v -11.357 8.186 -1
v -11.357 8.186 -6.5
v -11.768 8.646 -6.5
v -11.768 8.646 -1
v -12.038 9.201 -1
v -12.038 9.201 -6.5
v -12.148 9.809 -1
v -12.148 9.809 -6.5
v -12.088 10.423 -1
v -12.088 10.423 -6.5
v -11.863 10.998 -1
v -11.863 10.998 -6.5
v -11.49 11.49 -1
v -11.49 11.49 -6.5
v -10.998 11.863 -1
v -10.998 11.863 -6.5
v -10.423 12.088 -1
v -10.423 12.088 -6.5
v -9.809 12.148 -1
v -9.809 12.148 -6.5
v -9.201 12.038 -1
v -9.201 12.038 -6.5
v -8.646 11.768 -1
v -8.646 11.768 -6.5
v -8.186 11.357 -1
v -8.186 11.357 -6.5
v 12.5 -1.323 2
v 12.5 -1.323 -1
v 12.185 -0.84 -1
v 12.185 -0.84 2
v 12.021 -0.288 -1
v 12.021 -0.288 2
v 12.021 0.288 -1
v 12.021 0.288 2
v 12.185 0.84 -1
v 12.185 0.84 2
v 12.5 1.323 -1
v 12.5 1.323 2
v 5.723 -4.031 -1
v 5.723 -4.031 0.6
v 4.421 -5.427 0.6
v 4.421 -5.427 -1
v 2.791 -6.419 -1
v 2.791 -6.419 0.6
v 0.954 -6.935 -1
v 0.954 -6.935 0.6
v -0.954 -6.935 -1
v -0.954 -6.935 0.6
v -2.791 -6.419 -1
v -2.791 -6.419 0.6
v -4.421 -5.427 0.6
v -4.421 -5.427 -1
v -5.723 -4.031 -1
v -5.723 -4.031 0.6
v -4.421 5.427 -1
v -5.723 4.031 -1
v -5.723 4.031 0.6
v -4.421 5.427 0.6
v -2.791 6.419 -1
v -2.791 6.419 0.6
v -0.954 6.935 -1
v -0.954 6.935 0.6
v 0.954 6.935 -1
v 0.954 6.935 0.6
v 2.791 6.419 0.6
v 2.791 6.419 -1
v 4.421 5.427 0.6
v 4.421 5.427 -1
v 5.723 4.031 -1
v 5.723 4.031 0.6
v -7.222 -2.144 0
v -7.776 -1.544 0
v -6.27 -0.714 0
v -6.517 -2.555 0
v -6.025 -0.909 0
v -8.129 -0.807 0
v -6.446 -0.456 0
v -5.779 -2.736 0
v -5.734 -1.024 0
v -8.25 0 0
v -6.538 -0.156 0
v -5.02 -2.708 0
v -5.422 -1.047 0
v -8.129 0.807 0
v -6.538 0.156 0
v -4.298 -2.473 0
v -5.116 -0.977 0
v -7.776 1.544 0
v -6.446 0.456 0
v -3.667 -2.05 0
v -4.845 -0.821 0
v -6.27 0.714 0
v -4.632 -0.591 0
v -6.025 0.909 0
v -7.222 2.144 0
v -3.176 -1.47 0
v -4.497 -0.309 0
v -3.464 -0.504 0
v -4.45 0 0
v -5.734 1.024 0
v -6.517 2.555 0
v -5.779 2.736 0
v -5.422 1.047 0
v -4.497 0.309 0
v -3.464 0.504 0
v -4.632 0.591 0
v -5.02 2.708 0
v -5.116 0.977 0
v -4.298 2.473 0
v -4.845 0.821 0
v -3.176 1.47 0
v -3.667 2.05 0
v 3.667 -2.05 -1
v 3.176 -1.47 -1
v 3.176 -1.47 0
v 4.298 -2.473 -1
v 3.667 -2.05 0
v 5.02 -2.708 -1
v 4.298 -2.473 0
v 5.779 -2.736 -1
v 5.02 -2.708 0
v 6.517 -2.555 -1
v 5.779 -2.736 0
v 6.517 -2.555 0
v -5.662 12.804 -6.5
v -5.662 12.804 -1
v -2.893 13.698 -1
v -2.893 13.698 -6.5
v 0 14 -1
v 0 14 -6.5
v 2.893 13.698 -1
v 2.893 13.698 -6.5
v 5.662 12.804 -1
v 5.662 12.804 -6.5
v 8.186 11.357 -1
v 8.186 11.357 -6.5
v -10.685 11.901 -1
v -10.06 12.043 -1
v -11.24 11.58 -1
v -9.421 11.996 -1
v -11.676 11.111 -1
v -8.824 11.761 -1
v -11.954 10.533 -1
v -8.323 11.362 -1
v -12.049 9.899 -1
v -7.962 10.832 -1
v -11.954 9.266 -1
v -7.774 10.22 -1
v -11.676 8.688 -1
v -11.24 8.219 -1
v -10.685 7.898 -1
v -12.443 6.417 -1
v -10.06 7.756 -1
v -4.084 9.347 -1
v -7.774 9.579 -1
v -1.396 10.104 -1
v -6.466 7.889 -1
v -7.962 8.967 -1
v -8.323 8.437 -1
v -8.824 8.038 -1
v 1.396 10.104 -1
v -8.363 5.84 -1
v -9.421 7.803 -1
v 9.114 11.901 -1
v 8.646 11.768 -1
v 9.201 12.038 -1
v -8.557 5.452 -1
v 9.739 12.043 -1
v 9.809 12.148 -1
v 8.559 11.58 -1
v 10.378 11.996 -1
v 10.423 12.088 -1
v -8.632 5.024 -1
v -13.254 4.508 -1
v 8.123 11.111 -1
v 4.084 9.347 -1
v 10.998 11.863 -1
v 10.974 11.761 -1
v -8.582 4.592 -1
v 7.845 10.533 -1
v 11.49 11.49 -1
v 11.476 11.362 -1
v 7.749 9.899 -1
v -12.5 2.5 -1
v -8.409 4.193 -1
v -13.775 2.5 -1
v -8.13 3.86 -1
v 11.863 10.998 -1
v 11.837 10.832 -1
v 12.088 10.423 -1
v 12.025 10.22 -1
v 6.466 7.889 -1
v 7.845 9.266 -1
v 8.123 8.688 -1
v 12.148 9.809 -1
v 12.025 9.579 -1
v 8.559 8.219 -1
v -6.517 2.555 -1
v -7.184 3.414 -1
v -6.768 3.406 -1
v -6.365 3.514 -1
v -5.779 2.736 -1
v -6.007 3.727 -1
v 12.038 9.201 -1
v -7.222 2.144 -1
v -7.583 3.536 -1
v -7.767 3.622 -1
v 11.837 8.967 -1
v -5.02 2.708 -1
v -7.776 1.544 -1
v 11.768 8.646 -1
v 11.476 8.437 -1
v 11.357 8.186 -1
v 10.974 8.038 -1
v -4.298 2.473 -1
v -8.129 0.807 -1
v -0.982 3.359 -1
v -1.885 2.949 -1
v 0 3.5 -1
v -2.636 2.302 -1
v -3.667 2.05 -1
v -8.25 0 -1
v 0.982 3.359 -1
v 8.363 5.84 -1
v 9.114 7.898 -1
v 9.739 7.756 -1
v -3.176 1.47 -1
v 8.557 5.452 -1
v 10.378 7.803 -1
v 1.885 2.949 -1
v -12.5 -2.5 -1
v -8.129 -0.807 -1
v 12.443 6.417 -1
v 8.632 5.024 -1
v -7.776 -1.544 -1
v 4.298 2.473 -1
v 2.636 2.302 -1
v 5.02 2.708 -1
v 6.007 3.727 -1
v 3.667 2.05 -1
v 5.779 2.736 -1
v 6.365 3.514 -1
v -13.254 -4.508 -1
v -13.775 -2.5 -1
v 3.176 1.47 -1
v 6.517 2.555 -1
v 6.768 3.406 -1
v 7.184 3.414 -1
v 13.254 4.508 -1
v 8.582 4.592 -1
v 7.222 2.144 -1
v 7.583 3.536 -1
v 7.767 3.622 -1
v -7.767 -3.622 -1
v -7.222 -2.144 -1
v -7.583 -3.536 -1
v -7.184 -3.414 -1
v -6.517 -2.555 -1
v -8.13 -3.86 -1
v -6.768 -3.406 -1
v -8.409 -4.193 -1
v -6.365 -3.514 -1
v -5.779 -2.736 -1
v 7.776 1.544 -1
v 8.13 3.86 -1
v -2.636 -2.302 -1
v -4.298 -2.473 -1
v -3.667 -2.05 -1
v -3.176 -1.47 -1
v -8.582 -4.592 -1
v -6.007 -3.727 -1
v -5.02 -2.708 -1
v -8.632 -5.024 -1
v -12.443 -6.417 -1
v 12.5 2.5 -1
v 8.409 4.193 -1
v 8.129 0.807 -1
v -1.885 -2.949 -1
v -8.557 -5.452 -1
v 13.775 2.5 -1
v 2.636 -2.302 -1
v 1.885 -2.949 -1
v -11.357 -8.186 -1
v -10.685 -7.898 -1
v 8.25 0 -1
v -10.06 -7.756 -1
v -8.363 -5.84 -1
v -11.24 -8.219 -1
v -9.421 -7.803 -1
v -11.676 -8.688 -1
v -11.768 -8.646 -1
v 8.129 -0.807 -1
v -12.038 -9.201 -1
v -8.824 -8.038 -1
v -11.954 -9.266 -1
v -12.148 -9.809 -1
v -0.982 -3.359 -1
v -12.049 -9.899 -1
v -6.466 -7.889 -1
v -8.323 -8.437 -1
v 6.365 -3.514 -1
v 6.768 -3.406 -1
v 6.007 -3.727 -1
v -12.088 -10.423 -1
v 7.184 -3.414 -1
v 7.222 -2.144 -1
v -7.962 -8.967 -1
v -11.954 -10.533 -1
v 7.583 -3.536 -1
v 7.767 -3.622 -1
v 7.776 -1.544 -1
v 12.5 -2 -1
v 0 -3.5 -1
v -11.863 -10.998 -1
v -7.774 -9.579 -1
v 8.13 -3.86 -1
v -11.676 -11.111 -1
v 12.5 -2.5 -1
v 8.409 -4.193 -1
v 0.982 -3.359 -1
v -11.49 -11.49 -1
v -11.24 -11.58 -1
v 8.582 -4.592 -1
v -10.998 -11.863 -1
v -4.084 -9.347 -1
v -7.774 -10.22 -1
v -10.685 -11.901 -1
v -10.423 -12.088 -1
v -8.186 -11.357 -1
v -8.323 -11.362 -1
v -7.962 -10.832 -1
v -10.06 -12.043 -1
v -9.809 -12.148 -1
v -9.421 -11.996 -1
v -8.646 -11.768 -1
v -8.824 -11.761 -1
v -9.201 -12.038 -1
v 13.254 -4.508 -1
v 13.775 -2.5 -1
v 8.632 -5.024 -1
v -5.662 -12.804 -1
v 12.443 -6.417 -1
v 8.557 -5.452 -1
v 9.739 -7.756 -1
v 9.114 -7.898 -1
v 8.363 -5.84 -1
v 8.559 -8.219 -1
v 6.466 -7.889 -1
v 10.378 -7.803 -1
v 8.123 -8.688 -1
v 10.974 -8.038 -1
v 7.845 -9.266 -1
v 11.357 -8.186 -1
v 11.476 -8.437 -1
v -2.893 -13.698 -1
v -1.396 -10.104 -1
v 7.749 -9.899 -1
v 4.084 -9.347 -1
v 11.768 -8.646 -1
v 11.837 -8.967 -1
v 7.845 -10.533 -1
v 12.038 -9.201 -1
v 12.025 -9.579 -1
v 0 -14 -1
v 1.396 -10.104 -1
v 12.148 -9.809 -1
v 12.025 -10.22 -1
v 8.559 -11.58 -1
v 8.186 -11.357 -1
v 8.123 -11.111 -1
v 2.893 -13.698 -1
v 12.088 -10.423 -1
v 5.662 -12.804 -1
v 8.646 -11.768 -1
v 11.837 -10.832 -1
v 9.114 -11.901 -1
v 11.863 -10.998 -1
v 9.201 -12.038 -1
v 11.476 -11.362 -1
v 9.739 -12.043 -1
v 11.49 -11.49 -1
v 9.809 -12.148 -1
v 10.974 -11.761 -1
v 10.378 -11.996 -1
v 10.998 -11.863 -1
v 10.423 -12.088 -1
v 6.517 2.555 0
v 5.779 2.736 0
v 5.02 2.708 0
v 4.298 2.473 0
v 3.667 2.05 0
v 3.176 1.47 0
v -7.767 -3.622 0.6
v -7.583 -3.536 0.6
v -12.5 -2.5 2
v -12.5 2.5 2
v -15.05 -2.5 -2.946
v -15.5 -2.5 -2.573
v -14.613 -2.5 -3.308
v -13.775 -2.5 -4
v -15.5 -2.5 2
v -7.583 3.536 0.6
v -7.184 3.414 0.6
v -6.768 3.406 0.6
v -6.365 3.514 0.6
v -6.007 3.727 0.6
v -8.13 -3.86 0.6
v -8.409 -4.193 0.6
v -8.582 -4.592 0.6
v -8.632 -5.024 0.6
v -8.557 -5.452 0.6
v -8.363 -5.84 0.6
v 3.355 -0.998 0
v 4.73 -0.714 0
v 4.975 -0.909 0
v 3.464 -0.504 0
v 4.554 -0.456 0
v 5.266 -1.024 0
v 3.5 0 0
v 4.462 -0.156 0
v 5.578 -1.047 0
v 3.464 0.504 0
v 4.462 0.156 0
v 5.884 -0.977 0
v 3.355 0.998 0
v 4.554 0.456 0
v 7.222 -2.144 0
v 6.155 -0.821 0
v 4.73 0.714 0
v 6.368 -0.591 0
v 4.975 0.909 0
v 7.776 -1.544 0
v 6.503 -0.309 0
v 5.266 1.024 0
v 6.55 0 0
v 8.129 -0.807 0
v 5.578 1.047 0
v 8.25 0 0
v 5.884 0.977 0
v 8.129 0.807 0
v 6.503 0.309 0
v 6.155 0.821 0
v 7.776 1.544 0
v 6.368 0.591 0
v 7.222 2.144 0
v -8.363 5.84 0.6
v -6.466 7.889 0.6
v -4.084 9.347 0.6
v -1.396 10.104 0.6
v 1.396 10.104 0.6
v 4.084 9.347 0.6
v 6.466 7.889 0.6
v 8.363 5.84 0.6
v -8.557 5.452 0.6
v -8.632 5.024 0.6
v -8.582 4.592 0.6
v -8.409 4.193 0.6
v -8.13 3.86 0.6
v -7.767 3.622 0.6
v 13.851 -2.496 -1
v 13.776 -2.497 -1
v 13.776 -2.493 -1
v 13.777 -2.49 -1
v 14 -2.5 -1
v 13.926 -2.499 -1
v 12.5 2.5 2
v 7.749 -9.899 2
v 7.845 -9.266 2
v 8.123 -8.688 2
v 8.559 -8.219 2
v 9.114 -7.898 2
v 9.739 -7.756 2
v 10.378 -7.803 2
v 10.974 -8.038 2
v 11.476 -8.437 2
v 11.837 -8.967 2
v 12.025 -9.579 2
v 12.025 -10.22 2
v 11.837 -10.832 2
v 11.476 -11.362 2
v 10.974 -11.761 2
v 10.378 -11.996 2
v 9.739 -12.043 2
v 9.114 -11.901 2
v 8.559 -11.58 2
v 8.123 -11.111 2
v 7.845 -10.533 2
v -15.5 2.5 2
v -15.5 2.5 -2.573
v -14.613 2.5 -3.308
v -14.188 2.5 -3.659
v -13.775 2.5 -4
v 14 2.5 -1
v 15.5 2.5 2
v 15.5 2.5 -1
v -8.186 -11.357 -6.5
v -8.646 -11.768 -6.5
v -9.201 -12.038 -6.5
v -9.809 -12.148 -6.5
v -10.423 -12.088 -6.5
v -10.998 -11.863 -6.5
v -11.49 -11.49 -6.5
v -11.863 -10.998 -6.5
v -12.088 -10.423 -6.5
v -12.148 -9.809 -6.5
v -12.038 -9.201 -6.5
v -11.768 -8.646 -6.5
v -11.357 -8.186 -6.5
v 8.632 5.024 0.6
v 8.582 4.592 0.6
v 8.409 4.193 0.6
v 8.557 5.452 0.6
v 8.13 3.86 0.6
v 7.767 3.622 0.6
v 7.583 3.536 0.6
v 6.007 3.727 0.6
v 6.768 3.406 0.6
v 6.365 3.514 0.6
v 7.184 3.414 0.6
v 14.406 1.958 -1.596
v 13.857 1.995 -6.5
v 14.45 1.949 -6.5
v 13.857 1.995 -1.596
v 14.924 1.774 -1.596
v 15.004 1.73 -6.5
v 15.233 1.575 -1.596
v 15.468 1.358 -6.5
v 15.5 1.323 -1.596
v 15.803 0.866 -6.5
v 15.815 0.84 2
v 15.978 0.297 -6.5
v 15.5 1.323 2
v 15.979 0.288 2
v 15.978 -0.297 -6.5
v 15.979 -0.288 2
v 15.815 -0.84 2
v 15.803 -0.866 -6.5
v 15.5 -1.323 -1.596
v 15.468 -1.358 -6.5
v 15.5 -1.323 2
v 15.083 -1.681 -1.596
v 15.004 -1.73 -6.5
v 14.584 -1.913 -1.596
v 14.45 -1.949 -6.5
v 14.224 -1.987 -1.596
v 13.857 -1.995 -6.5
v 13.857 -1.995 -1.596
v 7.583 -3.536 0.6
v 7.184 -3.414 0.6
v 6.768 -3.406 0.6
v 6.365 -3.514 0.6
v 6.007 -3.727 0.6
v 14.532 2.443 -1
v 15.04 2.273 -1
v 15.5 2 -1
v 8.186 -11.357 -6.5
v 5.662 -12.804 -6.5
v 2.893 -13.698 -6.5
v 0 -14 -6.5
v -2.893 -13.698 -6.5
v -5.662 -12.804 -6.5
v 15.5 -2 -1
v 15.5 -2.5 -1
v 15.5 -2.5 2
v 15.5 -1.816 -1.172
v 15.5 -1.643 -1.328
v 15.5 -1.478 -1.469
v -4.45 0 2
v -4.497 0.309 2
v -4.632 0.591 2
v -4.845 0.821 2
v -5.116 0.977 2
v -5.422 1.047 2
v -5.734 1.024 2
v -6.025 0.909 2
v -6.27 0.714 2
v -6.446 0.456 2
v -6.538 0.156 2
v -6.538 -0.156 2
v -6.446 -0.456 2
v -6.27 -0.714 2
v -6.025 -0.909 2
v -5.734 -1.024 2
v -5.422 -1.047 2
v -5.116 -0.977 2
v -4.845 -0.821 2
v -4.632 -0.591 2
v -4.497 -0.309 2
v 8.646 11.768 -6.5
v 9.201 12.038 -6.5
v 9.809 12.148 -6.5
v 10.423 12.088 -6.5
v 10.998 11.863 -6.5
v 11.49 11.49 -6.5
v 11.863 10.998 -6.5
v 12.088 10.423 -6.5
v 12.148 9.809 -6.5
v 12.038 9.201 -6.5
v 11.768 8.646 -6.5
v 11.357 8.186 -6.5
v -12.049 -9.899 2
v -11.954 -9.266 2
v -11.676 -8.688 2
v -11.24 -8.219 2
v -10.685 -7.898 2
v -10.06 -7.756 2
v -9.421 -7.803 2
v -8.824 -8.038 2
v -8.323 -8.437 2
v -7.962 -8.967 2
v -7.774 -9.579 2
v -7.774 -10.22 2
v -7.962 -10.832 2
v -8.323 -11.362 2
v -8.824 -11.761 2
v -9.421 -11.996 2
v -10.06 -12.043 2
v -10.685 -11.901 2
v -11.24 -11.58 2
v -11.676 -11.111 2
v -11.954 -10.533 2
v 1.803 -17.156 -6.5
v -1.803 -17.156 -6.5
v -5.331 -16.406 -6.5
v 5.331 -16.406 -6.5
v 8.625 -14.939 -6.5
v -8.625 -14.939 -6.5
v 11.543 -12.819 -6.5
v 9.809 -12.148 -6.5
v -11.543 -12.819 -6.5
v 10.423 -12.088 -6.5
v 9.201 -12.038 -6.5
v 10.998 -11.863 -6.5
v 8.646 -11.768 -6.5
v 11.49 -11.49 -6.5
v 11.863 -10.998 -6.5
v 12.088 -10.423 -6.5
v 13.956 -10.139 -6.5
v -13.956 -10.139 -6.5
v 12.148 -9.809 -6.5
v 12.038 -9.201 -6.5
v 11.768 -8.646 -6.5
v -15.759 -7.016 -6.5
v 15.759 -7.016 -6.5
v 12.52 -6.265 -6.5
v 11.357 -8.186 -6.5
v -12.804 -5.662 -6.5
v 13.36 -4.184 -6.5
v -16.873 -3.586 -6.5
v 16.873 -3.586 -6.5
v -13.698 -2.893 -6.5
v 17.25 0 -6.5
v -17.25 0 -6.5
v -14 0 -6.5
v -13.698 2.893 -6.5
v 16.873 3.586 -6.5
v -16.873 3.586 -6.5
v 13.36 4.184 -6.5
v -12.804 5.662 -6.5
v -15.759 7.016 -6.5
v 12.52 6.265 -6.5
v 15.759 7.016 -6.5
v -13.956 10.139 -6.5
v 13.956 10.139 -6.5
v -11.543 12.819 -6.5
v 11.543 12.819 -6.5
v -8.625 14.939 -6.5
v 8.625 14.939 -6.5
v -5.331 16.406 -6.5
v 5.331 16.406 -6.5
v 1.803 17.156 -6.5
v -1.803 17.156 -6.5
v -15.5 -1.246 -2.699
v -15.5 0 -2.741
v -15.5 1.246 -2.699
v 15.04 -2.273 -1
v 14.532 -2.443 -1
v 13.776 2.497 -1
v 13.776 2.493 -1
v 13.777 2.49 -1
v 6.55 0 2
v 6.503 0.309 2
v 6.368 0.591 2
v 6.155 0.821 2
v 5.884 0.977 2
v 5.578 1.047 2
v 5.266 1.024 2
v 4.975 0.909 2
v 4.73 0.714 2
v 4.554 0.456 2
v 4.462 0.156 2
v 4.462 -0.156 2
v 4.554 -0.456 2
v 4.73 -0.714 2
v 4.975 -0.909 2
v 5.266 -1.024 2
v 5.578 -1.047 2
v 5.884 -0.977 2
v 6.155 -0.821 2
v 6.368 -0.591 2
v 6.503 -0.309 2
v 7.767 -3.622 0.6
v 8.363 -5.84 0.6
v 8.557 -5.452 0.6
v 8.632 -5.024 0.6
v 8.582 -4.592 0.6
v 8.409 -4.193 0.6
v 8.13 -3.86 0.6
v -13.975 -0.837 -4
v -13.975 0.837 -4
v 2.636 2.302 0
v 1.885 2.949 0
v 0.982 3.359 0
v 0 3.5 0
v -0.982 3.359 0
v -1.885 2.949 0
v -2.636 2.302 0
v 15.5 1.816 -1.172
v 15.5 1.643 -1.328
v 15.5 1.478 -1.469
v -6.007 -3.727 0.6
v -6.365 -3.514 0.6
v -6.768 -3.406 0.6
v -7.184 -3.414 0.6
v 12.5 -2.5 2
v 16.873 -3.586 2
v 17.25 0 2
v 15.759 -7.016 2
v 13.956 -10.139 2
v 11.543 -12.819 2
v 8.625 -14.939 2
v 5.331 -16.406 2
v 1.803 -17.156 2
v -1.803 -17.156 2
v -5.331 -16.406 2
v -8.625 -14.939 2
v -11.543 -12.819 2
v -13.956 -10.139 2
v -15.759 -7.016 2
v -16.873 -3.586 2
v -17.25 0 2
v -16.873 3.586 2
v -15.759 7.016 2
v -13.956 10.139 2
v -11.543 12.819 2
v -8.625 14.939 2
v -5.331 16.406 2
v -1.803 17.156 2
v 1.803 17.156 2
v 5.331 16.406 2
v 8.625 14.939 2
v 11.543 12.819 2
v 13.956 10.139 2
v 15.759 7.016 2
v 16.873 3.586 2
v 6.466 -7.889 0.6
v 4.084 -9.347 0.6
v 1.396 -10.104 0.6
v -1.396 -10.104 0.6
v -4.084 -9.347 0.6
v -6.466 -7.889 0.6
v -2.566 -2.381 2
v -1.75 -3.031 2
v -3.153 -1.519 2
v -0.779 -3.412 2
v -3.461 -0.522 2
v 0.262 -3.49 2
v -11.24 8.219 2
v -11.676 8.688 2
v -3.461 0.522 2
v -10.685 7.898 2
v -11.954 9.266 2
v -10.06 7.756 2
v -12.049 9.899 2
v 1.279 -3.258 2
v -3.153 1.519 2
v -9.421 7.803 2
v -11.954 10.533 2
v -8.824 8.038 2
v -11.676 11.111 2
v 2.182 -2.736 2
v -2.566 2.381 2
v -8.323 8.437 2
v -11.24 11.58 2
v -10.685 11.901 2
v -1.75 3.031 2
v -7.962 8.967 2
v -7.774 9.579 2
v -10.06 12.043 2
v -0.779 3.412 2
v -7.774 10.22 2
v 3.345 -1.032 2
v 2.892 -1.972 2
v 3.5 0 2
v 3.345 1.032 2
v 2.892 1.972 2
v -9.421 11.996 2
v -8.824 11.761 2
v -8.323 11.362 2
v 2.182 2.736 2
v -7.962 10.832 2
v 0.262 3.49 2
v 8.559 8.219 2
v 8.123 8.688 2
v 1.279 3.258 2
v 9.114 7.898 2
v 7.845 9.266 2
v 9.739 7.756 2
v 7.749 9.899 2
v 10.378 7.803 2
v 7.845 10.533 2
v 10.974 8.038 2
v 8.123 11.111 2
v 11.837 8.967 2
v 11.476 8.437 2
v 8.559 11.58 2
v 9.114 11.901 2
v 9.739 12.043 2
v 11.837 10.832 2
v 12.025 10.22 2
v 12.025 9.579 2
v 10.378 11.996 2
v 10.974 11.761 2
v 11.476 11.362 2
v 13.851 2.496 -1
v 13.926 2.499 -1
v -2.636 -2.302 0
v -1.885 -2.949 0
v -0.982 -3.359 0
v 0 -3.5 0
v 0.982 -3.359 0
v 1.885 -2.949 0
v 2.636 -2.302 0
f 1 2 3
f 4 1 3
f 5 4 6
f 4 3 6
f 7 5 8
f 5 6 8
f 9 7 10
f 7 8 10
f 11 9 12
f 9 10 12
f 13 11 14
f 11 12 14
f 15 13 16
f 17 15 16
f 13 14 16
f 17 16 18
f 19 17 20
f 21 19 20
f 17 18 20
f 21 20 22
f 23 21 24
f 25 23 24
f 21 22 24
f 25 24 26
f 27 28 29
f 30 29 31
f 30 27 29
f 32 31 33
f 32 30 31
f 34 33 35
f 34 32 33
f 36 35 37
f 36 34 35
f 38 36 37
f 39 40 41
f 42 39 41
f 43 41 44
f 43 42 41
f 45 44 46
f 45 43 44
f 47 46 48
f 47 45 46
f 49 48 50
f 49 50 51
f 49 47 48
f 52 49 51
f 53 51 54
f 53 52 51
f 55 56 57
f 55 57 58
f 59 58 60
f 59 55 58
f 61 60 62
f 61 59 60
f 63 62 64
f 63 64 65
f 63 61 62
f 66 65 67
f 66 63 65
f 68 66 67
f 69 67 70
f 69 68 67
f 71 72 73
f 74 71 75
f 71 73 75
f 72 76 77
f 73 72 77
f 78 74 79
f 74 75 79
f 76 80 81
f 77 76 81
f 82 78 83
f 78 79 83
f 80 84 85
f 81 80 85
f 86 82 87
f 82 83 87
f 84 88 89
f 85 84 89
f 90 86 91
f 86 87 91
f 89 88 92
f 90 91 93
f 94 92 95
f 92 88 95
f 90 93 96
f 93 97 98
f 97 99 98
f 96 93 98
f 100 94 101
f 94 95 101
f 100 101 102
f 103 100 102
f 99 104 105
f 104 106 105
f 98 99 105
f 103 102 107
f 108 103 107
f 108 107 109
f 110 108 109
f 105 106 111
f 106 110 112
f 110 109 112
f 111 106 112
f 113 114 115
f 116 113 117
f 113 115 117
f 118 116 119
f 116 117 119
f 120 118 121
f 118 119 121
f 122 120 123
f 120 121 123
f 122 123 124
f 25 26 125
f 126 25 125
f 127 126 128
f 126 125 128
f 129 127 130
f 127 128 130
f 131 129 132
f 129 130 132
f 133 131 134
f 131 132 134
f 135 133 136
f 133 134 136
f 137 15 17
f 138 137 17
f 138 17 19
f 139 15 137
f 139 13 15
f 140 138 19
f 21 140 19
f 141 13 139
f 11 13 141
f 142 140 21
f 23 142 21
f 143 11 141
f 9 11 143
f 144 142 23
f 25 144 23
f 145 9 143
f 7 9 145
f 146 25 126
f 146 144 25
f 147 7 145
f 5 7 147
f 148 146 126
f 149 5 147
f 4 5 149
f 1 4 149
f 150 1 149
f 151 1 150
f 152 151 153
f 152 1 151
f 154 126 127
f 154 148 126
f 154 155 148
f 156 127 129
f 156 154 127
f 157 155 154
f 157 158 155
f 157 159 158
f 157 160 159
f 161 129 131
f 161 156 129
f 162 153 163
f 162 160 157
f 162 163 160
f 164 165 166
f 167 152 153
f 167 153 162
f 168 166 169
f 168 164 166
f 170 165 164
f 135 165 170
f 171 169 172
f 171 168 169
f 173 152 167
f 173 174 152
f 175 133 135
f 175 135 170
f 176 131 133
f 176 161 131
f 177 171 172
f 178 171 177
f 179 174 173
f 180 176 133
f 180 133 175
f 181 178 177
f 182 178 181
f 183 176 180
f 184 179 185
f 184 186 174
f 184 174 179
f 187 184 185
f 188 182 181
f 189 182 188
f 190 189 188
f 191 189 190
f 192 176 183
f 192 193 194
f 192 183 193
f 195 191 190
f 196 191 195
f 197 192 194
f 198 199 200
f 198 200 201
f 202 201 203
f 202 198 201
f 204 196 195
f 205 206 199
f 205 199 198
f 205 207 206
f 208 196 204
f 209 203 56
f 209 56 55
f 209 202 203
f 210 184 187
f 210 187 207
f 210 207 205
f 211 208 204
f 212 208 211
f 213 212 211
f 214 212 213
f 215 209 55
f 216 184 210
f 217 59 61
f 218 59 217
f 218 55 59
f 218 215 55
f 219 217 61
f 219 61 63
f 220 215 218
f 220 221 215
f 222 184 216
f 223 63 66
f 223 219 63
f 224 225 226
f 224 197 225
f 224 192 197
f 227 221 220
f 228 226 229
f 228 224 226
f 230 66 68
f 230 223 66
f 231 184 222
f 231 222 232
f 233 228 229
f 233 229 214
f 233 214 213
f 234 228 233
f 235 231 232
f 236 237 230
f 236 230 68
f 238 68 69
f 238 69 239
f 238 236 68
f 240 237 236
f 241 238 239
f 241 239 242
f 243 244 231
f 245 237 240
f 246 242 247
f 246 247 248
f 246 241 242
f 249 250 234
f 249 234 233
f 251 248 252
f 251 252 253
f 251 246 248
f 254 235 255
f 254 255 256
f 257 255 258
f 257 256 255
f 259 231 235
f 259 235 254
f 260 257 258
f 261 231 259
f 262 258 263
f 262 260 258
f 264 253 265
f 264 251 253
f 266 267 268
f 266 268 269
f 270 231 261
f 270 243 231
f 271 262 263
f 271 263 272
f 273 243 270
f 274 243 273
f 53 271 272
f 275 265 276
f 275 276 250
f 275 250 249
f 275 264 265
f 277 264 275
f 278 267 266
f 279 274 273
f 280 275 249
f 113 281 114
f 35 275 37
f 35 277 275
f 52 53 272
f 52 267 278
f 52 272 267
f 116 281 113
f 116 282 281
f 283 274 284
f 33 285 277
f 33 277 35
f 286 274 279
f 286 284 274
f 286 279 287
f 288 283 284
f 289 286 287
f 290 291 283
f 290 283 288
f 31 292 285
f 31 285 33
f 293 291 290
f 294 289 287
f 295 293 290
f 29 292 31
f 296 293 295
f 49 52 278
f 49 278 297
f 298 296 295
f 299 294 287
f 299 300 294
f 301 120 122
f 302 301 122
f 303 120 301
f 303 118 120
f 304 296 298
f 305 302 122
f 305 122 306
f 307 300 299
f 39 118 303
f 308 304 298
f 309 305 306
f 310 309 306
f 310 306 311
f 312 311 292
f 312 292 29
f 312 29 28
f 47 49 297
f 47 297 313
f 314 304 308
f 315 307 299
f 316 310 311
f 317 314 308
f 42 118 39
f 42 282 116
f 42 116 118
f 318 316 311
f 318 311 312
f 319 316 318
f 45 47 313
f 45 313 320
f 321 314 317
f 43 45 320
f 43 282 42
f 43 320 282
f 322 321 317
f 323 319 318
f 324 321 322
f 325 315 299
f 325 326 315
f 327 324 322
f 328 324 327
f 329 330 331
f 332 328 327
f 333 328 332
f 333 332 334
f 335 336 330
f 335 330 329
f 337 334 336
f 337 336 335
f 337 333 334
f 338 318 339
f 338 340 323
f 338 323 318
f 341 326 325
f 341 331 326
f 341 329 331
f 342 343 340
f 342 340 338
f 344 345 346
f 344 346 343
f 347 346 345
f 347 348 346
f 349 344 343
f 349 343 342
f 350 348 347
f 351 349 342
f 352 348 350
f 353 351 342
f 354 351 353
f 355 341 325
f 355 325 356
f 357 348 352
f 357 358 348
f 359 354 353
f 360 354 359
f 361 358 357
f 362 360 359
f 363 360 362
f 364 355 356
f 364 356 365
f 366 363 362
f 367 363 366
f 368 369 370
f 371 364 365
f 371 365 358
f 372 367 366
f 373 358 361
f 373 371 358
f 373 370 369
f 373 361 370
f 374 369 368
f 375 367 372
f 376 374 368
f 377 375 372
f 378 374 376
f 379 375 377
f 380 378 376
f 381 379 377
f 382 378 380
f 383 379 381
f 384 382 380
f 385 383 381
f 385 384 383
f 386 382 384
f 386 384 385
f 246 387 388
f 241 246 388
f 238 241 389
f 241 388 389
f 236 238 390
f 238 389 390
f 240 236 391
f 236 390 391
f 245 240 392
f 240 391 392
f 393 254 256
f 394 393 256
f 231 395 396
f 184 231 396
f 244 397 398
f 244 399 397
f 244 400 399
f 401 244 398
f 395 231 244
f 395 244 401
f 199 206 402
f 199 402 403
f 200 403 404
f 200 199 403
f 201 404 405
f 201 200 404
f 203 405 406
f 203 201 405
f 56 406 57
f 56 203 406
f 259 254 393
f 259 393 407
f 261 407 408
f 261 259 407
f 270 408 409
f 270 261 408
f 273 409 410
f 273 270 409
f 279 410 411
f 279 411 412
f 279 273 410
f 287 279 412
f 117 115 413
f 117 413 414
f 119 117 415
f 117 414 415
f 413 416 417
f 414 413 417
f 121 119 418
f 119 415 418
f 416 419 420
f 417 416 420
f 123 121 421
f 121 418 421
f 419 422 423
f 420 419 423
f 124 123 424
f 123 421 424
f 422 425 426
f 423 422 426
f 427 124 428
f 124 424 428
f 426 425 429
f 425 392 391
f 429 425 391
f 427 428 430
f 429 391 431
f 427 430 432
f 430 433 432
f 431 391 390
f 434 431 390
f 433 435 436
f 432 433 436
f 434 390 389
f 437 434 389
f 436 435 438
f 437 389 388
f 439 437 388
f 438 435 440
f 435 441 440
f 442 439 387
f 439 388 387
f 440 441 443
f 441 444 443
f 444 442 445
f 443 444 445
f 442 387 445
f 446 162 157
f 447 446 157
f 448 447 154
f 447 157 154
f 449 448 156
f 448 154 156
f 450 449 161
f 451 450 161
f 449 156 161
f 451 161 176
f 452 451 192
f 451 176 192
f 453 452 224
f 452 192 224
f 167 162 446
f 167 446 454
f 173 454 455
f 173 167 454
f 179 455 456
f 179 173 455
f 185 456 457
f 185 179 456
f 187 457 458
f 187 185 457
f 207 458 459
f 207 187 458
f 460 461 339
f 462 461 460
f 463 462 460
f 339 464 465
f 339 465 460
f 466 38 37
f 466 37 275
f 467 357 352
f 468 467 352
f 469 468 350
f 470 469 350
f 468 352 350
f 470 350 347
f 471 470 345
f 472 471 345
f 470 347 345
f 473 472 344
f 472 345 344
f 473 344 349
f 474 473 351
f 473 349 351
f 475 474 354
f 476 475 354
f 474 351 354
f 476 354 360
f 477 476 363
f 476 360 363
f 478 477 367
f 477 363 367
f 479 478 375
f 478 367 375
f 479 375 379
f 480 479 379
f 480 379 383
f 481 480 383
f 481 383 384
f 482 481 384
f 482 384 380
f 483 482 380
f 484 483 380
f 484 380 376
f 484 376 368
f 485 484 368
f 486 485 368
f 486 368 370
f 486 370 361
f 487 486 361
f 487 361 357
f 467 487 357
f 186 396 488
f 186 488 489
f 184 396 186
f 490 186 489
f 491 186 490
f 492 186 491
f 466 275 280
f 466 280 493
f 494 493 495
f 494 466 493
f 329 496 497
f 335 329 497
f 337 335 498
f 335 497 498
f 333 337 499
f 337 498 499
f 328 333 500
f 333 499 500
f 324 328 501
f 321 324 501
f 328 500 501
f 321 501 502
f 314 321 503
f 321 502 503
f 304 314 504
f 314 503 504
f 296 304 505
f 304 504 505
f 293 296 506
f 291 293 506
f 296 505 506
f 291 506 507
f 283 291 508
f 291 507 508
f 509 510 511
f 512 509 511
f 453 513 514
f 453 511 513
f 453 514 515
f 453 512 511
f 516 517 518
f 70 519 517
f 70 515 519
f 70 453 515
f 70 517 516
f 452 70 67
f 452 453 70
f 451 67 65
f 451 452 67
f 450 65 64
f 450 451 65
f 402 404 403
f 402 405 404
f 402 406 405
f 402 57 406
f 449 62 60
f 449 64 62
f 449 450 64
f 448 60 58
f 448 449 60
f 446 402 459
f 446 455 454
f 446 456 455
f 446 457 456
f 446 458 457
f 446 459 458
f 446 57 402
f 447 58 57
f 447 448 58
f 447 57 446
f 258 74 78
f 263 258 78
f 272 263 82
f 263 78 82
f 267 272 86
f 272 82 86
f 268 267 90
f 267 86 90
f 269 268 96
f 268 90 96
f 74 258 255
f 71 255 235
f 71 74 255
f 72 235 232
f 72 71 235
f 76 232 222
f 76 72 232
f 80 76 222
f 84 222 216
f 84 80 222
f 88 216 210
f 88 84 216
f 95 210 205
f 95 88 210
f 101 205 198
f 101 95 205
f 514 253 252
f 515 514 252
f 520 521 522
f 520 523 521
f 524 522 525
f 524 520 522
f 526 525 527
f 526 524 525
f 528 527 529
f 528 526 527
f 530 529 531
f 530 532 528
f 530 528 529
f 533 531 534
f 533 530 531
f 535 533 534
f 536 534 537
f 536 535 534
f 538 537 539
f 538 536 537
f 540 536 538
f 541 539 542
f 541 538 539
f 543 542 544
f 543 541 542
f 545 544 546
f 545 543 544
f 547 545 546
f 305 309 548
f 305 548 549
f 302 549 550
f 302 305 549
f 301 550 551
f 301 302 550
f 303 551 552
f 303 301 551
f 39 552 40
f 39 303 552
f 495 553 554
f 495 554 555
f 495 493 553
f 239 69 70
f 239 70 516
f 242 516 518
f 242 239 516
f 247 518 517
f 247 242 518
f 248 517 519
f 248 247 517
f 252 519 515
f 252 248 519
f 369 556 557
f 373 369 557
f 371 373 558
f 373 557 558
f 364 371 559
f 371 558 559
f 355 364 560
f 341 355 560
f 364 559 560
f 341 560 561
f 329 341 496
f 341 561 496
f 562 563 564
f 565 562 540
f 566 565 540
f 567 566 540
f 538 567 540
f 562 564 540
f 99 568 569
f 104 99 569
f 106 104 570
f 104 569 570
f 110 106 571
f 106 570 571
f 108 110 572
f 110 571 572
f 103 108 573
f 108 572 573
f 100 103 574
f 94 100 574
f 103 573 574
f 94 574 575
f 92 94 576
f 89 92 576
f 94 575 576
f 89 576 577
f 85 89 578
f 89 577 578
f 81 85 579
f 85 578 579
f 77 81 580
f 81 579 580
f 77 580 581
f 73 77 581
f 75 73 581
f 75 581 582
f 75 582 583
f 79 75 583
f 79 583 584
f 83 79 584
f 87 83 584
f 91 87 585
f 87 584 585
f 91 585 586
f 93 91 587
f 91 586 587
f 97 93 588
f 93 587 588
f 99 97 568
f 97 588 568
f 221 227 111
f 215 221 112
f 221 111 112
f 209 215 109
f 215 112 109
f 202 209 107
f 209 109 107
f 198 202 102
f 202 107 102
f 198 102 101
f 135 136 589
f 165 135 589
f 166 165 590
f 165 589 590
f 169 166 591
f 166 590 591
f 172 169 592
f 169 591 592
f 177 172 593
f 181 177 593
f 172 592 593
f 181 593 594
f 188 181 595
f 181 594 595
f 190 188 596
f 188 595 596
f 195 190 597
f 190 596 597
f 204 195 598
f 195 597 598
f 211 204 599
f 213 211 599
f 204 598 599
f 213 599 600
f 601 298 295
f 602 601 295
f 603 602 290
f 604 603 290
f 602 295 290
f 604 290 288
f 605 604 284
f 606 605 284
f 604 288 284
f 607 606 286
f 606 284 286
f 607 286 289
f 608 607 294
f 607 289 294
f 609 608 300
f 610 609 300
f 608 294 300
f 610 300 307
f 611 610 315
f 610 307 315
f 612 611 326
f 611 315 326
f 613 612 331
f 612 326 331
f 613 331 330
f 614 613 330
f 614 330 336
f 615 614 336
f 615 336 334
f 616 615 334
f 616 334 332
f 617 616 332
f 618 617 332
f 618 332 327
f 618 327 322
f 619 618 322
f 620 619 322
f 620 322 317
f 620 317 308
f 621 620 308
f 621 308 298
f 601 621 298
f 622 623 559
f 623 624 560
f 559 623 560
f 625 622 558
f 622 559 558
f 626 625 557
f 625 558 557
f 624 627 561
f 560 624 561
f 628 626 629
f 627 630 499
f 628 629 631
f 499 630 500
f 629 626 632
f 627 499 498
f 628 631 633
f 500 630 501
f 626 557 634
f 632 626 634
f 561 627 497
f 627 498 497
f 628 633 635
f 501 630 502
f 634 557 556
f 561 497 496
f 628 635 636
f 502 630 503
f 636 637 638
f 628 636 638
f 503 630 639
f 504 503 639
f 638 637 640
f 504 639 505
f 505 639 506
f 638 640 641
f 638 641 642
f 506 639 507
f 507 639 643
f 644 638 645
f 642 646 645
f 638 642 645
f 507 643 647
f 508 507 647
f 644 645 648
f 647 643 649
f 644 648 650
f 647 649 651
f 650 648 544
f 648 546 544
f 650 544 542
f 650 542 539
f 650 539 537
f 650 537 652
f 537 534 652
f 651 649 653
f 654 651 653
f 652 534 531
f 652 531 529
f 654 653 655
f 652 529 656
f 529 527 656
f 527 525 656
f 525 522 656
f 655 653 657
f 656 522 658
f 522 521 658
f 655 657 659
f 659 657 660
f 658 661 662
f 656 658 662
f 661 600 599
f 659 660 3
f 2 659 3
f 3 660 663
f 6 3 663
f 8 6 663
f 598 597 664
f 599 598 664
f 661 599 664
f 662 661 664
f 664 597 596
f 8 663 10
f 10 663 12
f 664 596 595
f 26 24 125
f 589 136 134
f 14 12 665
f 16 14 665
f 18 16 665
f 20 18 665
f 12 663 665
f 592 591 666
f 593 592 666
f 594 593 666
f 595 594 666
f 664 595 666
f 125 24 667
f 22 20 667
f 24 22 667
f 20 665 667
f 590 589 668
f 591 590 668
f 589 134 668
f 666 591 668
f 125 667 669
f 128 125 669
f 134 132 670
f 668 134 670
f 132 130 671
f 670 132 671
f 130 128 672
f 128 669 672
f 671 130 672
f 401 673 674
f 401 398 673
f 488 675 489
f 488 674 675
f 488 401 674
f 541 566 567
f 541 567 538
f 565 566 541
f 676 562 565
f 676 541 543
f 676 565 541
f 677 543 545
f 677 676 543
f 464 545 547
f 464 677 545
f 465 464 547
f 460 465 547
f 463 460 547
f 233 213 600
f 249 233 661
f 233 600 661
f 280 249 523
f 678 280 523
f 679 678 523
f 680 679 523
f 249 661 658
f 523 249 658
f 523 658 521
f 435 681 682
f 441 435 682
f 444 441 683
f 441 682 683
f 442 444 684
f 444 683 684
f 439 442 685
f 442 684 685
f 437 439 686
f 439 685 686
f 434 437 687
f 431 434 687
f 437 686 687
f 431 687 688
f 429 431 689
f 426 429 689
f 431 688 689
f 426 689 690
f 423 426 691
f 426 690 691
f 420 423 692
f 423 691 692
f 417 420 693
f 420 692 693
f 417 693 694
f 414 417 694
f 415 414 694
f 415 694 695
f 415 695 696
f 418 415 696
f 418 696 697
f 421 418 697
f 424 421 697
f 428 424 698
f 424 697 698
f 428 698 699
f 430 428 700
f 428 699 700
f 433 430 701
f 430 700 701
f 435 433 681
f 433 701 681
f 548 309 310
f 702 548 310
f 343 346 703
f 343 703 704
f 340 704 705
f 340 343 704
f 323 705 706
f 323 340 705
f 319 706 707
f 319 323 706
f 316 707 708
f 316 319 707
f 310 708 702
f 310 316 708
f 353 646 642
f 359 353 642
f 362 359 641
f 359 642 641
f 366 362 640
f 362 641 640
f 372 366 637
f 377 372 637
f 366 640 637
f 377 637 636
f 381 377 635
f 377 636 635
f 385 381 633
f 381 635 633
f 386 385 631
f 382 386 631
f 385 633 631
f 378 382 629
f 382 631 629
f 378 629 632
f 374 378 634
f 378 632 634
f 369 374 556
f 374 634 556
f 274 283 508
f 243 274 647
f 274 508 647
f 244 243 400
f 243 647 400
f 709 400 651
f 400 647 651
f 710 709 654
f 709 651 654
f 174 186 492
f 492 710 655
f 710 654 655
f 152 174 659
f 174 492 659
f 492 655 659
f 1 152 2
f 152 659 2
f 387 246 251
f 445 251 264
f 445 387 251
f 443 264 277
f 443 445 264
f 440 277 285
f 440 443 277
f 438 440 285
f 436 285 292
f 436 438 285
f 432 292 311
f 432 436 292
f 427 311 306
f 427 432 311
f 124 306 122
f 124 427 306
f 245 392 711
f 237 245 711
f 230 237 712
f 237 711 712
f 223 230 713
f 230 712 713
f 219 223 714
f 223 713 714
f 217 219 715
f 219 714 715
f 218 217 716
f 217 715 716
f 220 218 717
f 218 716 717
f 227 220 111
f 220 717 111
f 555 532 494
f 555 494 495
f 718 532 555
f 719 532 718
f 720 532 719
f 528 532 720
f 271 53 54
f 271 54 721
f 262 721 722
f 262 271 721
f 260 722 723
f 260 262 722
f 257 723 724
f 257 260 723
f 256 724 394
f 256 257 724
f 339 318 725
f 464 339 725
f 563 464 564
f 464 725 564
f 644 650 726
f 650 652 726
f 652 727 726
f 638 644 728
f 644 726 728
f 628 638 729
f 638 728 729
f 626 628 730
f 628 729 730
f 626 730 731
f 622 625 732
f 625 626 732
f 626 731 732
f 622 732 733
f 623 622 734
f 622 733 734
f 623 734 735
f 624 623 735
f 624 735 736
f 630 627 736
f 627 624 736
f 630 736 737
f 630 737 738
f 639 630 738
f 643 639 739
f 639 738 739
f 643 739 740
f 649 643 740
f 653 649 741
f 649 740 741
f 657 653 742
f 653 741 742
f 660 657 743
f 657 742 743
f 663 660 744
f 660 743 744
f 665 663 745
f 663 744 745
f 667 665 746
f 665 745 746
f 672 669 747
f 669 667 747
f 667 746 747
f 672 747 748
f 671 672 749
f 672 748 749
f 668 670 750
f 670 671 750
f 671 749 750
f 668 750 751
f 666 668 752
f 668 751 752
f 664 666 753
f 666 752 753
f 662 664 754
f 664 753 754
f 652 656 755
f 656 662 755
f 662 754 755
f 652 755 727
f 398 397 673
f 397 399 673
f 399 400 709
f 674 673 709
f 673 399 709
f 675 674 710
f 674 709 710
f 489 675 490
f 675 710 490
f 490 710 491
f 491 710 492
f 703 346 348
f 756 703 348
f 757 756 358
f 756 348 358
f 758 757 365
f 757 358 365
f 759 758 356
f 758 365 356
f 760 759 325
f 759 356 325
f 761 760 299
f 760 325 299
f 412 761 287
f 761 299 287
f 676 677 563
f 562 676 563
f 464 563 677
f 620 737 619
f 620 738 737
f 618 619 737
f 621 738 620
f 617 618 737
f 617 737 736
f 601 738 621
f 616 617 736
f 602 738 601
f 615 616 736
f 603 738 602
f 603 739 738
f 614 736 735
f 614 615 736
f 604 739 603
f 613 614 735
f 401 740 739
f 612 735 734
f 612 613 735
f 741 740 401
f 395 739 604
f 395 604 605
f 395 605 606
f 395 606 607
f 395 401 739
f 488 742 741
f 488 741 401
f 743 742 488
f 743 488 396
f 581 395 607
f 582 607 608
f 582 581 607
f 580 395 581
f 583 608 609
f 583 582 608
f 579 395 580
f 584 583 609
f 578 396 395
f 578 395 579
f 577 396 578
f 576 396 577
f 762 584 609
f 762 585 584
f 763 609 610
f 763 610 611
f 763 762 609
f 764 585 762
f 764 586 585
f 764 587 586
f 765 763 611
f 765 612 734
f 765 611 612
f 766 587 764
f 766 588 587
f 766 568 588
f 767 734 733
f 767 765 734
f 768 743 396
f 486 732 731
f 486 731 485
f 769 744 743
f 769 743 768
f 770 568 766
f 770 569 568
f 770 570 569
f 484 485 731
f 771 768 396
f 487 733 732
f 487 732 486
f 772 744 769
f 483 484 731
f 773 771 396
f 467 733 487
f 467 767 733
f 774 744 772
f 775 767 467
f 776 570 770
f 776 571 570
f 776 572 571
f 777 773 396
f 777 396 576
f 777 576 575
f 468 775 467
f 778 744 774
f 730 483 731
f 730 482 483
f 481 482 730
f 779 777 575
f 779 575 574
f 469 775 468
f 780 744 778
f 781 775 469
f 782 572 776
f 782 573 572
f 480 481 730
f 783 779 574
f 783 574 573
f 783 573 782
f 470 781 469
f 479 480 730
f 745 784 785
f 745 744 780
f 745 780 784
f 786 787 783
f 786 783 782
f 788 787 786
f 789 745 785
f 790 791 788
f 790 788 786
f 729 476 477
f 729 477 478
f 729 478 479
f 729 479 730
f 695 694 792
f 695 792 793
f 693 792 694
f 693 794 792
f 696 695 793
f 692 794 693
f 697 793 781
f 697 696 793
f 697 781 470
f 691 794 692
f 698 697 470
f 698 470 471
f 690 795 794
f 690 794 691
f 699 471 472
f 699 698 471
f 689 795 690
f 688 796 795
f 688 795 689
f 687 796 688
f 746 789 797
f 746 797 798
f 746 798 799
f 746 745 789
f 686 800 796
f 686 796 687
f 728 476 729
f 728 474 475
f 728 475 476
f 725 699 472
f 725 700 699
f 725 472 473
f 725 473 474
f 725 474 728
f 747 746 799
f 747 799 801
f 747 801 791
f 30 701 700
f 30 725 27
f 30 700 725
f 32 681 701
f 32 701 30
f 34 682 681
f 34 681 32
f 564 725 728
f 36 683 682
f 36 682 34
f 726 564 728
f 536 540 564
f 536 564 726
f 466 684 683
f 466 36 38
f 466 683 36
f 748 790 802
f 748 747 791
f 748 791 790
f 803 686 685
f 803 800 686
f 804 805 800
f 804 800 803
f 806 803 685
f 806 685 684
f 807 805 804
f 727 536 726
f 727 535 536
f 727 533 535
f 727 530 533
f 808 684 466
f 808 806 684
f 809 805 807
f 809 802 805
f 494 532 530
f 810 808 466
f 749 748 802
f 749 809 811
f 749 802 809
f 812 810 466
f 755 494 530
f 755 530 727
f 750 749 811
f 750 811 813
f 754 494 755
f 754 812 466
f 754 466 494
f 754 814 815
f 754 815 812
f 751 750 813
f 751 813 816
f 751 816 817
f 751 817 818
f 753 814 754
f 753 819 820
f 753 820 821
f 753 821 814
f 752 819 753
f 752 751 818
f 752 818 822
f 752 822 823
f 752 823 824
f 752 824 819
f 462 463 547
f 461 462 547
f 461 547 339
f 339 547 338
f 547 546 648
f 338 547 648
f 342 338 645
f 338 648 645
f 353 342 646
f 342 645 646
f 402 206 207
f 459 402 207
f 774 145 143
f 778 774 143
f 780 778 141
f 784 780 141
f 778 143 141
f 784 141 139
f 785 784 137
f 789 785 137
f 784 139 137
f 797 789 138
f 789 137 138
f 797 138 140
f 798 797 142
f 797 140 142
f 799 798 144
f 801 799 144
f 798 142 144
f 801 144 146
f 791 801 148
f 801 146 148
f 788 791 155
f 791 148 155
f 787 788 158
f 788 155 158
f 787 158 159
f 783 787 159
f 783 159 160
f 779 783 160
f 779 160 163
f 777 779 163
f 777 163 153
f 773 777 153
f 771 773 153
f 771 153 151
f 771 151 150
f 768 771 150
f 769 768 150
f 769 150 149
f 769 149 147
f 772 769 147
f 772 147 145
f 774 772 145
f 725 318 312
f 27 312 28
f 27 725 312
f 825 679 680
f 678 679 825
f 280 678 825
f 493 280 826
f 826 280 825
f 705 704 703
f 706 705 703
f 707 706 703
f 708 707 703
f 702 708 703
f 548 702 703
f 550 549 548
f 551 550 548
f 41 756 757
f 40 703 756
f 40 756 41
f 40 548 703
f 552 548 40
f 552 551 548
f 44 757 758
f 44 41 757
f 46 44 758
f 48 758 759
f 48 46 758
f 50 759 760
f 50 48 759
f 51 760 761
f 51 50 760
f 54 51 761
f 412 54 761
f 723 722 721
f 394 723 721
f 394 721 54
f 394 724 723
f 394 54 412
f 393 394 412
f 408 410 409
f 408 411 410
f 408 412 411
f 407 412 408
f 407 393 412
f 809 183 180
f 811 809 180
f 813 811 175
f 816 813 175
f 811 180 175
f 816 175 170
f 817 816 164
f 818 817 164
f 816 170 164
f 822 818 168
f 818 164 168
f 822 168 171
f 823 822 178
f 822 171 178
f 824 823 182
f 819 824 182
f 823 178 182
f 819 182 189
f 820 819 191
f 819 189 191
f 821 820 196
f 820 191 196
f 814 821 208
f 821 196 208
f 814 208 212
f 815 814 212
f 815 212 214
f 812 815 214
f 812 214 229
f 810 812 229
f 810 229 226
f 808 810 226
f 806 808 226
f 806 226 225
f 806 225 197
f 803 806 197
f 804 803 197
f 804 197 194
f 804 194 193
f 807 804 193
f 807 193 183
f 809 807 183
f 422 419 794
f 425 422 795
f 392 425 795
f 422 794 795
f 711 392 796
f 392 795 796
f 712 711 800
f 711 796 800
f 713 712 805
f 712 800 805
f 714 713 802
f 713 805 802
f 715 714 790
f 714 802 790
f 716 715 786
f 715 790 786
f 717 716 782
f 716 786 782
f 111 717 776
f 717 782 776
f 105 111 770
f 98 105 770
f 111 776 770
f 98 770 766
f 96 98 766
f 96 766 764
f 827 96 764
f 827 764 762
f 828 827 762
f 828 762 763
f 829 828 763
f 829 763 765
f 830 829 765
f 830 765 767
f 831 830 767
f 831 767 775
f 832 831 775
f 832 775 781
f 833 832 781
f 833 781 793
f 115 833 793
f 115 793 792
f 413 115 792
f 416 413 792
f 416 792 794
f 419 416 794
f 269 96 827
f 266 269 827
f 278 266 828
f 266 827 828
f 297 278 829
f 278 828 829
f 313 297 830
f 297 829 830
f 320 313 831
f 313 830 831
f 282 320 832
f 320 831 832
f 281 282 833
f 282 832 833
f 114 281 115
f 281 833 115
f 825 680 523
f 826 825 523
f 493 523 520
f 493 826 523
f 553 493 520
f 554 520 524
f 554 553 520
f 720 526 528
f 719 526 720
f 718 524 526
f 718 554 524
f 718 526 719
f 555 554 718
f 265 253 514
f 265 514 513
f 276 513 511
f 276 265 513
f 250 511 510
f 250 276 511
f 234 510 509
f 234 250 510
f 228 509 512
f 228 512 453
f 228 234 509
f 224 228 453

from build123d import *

# Parameters (mm, degrees)
SKETCH_1_R               = 20
EXTRUDE_1_DEPTH          = 2
SKETCH_2_R               = 3.5
CUT_EXTRUDE_1_DEPTH      = 2
SKETCH_3_R               = 1.05
CUT_EXTRUDE_2_DEPTH      = 2
EXTRUDE_START            = 1
SKETCH_5_R               = 20
SKETCH_5_R_2             = 8.25
EXTRUDE_3_DEPTH          = 1
EXTRUDE_4_DEPTH          = 1
SKETCH_9_R               = 10.2
SKETCH_9_R_2             = 7
CUT_EXTRUDE_3_DEPTH      = 1.6
EXTRUDE_START_2          = 1.6
EXTRUDE_5_DEPTH          = 1.6
PATTERN_CIRCULAR_2_COUNT = 2
SKETCH_13_R              = 2.75
CUT_EXTRUDE_4_DEPTH      = 1.6
FILLET_1_R               = 1.5
SKETCH_14_R              = 2.15
CUT_EXTRUDE_5_DEPTH      = 10
SKETCH_15_W              = 3
SKETCH_15_H              = 5
CUT_EXTRUDE_6_DEPTH      = 10
CHAMFER_1_SIZE           = 1
OTHER_START              = -10.264946541
OTHER_4149_OUTLINE_R     = 17.5
OTHER_4149_DEPTH         = 5.5
MOVE_BODY_2_ANGLE        = 45
CHAMFER_2_SIZE           = 1.191753593
CHAMFER_2_SIZE_2         = 1
CHAMFER_3_SIZE           = 3.575260778
CHAMFER_3_SIZE_2         = 3
SKETCH_19_OUTSIDE_W      = 53.44
SKETCH_19_OUTSIDE_H      = 53.44
SKETCH_19_OUTSIDE_R      = 17.25
CUT_EXTRUDE_7_DEPTH      = 25
CUT_EXTRUDE_9_DEPTH      = 10
CUT_EXTRUDE_9_DEPTH_BACK = 10
SKETCH_21_R              = 2
SKETCH_22_OUTSIDE_W      = 53.44
SKETCH_22_OUTSIDE_H      = 53.44
SKETCH_22_OUTSIDE_R      = 17.25
CUT_EXTRUDE_10_DEPTH     = 10


with BuildPart() as part:
    # 草图1 → 凸台-拉伸1 (new body)
    with BuildSketch(Plane.XY):
        Circle(SKETCH_1_R)
    extrude(amount=EXTRUDE_1_DEPTH)

    # 草图2 → 切除-拉伸1 (cut)
    with BuildSketch(Plane.XY.offset(2)):
        Circle(SKETCH_2_R)
    extrude(amount=-CUT_EXTRUDE_1_DEPTH, mode=Mode.SUBTRACT)

    # 草图3 → 切除-拉伸2 (cut)
    with BuildSketch(Plane.XY.offset(2)):
        with Locations((-5.5, 0)):
            Circle(SKETCH_3_R)
        with Locations((5.5, 0)):
            Circle(SKETCH_3_R)
    extrude(amount=-CUT_EXTRUDE_2_DEPTH, mode=Mode.SUBTRACT)

    # 草图5 → 凸台-拉伸3 (add)
    with BuildSketch(Plane(origin=(0, 0, 0), x_dir=(-1, 0, 0), z_dir=(0, 0, -1)).offset(EXTRUDE_START)):
        Circle(SKETCH_5_R)
        Circle(SKETCH_5_R_2, mode=Mode.SUBTRACT)
    extrude(amount=-EXTRUDE_3_DEPTH)

    # 草图8 → 凸台-拉伸4 (add)
    with BuildSketch(Plane(origin=(0, 0, 0), x_dir=(-1, 0, 0), z_dir=(0, 0, -1))):
        with BuildLine():
            ThreePointArc((3.176136364, 1.470427761), (6.265465545, 2.641318326), (8.25, 0))
            ThreePointArc((8.25, 0), (0, 8.25), (-8.25, 0))
            ThreePointArc((-8.25, 0), (-6.265465545, 2.641318326), (-3.176136364, 1.470427761))
            ThreePointArc((-3.176136364, 1.470427761), (0, 3.5), (3.176136364, 1.470427761))
        make_face()
        with BuildLine():
            ThreePointArc((-8.25, 0), (0, -8.25), (8.25, 0))
            ThreePointArc((8.25, 0), (6.265465545, -2.641318326), (3.176136364, -1.470427761))
            ThreePointArc((3.176136364, -1.470427761), (0, -3.5), (-3.176136364, -1.470427761))
            ThreePointArc((-3.176136364, -1.470427761), (-6.265465545, -2.641318326), (-8.25, 0))
        make_face()
    extrude(amount=EXTRUDE_4_DEPTH)

    # 草图9 → 切除-拉伸3 (cut)
    with BuildSketch(Plane(origin=(0, 0, -1), x_dir=(-1, 0, 0), z_dir=(0, 0, -1))):
        Circle(SKETCH_9_R)
        Circle(SKETCH_9_R_2, mode=Mode.SUBTRACT)
    extrude(amount=-CUT_EXTRUDE_3_DEPTH, mode=Mode.SUBTRACT)

    # 草图12 → 凸台-拉伸5 (add)
    with BuildSketch(Plane(origin=(0, 0, 0.6), x_dir=(-1, 0, 0), z_dir=(0, 0, -1)).offset(EXTRUDE_START_2)):
        with BuildLine():
            Line((6.344154509, 2.958327832), (9.244339428, 4.31070627))
            ThreePointArc((9.244339428, 4.31070627), (10.2, 0), (9.244339428, -4.31070627))
            Line((9.244339428, -4.31070627), (6.344154509, -2.958327832))
            ThreePointArc((6.344154509, -2.958327832), (7, 0), (6.344154509, 2.958327832))
        make_face()
    extrude_5 = extrude(amount=-EXTRUDE_5_DEPTH)

    # 阵列(圆周)2: 凸台-拉伸5 ×2 about axis
    pattern_circular_2_axis = Axis((0, 0, 0), (0, 0, 1))
    for i in range(1, PATTERN_CIRCULAR_2_COUNT):
        add(extrude_5.rotate(pattern_circular_2_axis, i * 360 / PATTERN_CIRCULAR_2_COUNT))

    # 草图13 → 切除-拉伸4 (cut)
    with BuildSketch(Plane(origin=(0, 0, 0), x_dir=(-1, 0, 0), z_dir=(0, 0, -1))):
        with Locations((5.5, 0)):
            Circle(SKETCH_13_R)
        with Locations((-5.5, 0)):
            Circle(SKETCH_13_R)
    extrude(amount=CUT_EXTRUDE_4_DEPTH, mode=Mode.SUBTRACT)

    # 圆角1
    # the kernel refuses this fillet: 1.5 mm, written as the material it adds along each edge
    with BuildSketch(Plane(origin=(6.344154509, 2.958327832, -1), x_dir=(0.9063077870366493, 0.42261826174070116, 0), z_dir=(0, 0, 1)), Plane(origin=(-6.344154509, -2.958327832, -1), x_dir=(-0.9063077870366493, -0.4226182617407009, 0), z_dir=(0, 0, 1))) as fillet_1_piece_1:
        with BuildLine():
            CenterArc((1.366600265, 1.5), FILLET_1_R, 190.164248622, 79.835751378)
            ThreePointArc((-0.109858605, 1.235294118), (-0.027518743, 0.620084766), (0, 0))
            Line((0, 0), (1.366600265, 0))
        make_face()
    extrude(amount=1.6)
    with BuildSketch(Plane(origin=(9.244339428, 4.31070627, -1), x_dir=(-0.4994572119030246, 0.8663385559226007, 0), z_dir=(0, 0, 1)), Plane(origin=(-9.244339428, -4.31070627, -1), x_dir=(0.49945721190302483, -0.8663385559226006, 0), z_dir=(0, 0, 1))) as fillet_1_piece_2:
        with BuildLine():
            CenterArc((1.635444705, 1.494373677), FILLET_1_R, 175.035904079, 99.928191842)
            Line((0.141071027, 1.624170876), (0, 0))
            ThreePointArc((0, 0), (0.882620952, -0.038258995), (1.765241903, 0))
        make_face()
    extrude(amount=1.6)
    with BuildSketch(Plane(origin=(9.244339428, -4.31070627, -1), x_dir=(-0.4994572119030251, -0.8663385559226003, 0), z_dir=(0, 0, 1)), Plane(origin=(-9.244339428, 4.31070627, -1), x_dir=(0.4994572119030254, 0.8663385559226003, 0), z_dir=(0, 0, 1))) as fillet_1_piece_3:
        with BuildLine():
            CenterArc((1.635444705, -1.494373677), FILLET_1_R, 85.035904079, 99.928191842)
            Line((0.141071027, -1.624170876), (0, 0))
            ThreePointArc((0, 0), (0.882620952, 0.038258995), (1.765241903, 0))
        make_face()
    extrude(amount=1.6)
    with BuildSketch(Plane(origin=(-6.344154509, 2.958327832, -1), x_dir=(-0.9063077870366493, 0.42261826174070083, 0), z_dir=(0, 0, 1)), Plane(origin=(6.344154509, -2.958327832, -1), x_dir=(0.9063077870366492, -0.4226182617407011, 0), z_dir=(0, 0, 1))) as fillet_1_piece_4:
        with BuildLine():
            CenterArc((1.366600265, -1.5), FILLET_1_R, 90, 79.835751378)
            ThreePointArc((-0.109858605, -1.235294118), (-0.027518743, -0.620084766), (0, 0))
            Line((0, 0), (1.366600265, 0))
        make_face()
    extrude(amount=1.6)

    # 草图14 → 切除-拉伸5 (cut)
    with BuildSketch(Plane(origin=(0, 0, -1), x_dir=(-1, 0, 0), z_dir=(0, 0, -1))):
        with Locations((9.899494937, -9.899494937)):
            Circle(SKETCH_14_R)
        with Locations((-9.899494937, -9.899494937)):
            Circle(SKETCH_14_R)
        with Locations((-9.899494937, 9.899494937)):
            Circle(SKETCH_14_R)
        with Locations((9.899494937, 9.899494937)):
            Circle(SKETCH_14_R)
    extrude(amount=-CUT_EXTRUDE_5_DEPTH, mode=Mode.SUBTRACT)

    # 草图15 → 切除-拉伸6 (cut)
    with BuildSketch(Plane.XY.offset(2)):
        with Locations((-14, 0)):
            Rectangle(SKETCH_15_W, SKETCH_15_H)
        with Locations((14, 0)):
            Rectangle(SKETCH_15_W, SKETCH_15_H)
    extrude(amount=-CUT_EXTRUDE_6_DEPTH, mode=Mode.SUBTRACT)

    # 倒角1
    chamfer_1_edges = [part.edges().sort_by_distance(p)[0] for p in [
        (20, 0, -1),
    ]]
    chamfer(chamfer_1_edges, length=CHAMFER_1_SIZE - 0.0001)  # a hair under: the kernel refuses the full size


with BuildPart() as body_2:
    # Other 4149: read off the stored shape, not the designer's step
    # Other 4149 outline → Other 4149 (new body)
    with BuildSketch(Plane.XY.offset(OTHER_START)):
        with Locations((-19.945533416, 28.7887379)):
            Circle(OTHER_4149_OUTLINE_R)
        with BuildLine():
            ThreePointArc((-9.043722475, 20.005201129), (-8.985378308, 17.828582791), (-11.161996645, 17.88692696))
            ThreePointArc((-11.161996645, 17.88692696), (-14.242692887, 16.0029016), (-17.70280961, 14.969541472))
            ThreePointArc((-17.70280961, 14.969541472), (-19.945533416, 12.5387379), (-22.188257221, 14.969541472))
            ThreePointArc((-22.188257221, 14.969541472), (-29.845028352, 18.889242964), (-33.764729844, 26.546014095))
            ThreePointArc((-33.764729844, 26.546014095), (-36.195533416, 28.788737901), (-33.764729844, 31.031461706))
            ThreePointArc((-33.764729844, 31.031461706), (-29.845028352, 38.688232837), (-22.188257221, 42.607934329))
            ThreePointArc((-22.188257221, 42.607934329), (-19.945533416, 45.0387379), (-17.70280961, 42.607934329))
            ThreePointArc((-17.70280961, 42.607934329), (-10.046038479, 38.688232837), (-6.126336987, 31.031461706))
            ThreePointArc((-6.126336987, 31.031461706), (-3.695533416, 28.788737901), (-6.126336987, 26.546014095))
            ThreePointArc((-6.126336987, 26.546014095), (-7.159697115, 23.085897372), (-9.043722475, 20.005201129))
        make_face(mode=Mode.SUBTRACT)
    extrude(amount=OTHER_4149_DEPTH)


with BuildPart() as body_2_1:
    # Move Body 2: read off the stored shape, not the designer's step
    # Move Body 2: moved
    add(body_2.part.moved(Location((19.9455334, -28.7887379, 3.7649465))).rotate(Axis((0, 0, 0), (0, 0, 1)), MOVE_BODY_2_ANGLE))

    # Combine 1: union part
    add(part.part)

    # 倒角2
    # the kernel refuses this chamfer: 1.191753593, 1 mm, written as the material it takes off along each edge
    with BuildSketch(Plane(origin=(13.999999989, -1.1e-08, -1.000000041), x_dir=(1, 0, 0), z_dir=(0, 1, 0))) as chamfer_2_piece_1_section:
        Polygon((1.5, CHAMFER_2_SIZE), (1.5 + CHAMFER_2_SIZE_2, 0), (1.5, 0), align=None)
    chamfer_2_piece_1 = revolve(axis=Axis((13.999999989, -1.1e-08, -1.000000041), (0, 0, -1)), revolution_arc=210.449028023, mode=Mode.PRIVATE)
    chamfer_2_piece_1 = split(chamfer_2_piece_1, bisect_by=Plane(origin=(15.5, -1.1e-08, -1.000000041), z_dir=(-1, 0, 0)), keep=Keep.TOP, mode=Mode.PRIVATE)
    add(chamfer_2_piece_1, mode=Mode.SUBTRACT)
    with BuildSketch(Plane(origin=(13.999999989, -1.1e-08, -1.000000041), x_dir=(-0.8620803404154466, -0.506771631673664, 0), z_dir=(0.506771631673664, -0.8620803404154466, 0))) as chamfer_2_piece_2_section:
        Polygon((1.5, CHAMFER_2_SIZE), (1.5 + CHAMFER_2_SIZE_2, 0), (1.5, 0), align=None)
    chamfer_2_piece_2 = revolve(axis=Axis((13.999999989, -1.1e-08, -1.000000041), (0, 0, -1)), revolution_arc=210.449027996, mode=Mode.PRIVATE)
    chamfer_2_piece_2 = split(chamfer_2_piece_2, bisect_by=Plane(origin=(15.5, -1.1e-08, -1.000000041), z_dir=(-1, 0, 0)), keep=Keep.TOP, mode=Mode.PRIVATE)
    add(chamfer_2_piece_2, mode=Mode.SUBTRACT)

    # 倒角3
    # the kernel refuses this chamfer: 3.575260778, 3 mm, written as the material it takes off along each edge
    with BuildSketch(Plane(origin=(-1.1e-08, -1.1e-08, -1.000000041), x_dir=(-0.6691326945986151, -0.743142945212559, 0), z_dir=(0.743142945212559, -0.6691326945986151, 0))) as chamfer_3_piece_1_section:
        Polygon((14 + CHAMFER_3_SIZE, 0), (14, CHAMFER_3_SIZE_2), (14, 0), align=None)
    chamfer_3_piece_1 = revolve(axis=Axis((-1.1e-08, -1.1e-08, -1.000000041), (0, 0, -1)), revolution_arc=95.999678085, mode=Mode.PRIVATE)
    chamfer_3_piece_1 = split(chamfer_3_piece_1, bisect_by=Plane(origin=(-15.5, -1.1e-08, -1.000000041), z_dir=(1, 0, 0)), keep=Keep.TOP, mode=Mode.PRIVATE)
    chamfer_3_piece_1 = split(chamfer_3_piece_1, bisect_by=Plane(origin=(-1.1e-08, -2.5, -1.000000041), z_dir=(0, 1, 0)), keep=Keep.TOP, mode=Mode.PRIVATE)
    chamfer_3_piece_1 = split(chamfer_3_piece_1, bisect_by=Plane(origin=(-1.1e-08, 2.5, -1.000000041), z_dir=(0, -1, 0)), keep=Keep.TOP, mode=Mode.PRIVATE)
    add(chamfer_3_piece_1, mode=Mode.SUBTRACT)

    # 草图19 outside → 切除-拉伸7 (cut)
    with BuildSketch(Plane(origin=(0, 0, -1), x_dir=(-1, 0, 0), z_dir=(0, 0, -1))):
        Rectangle(SKETCH_19_OUTSIDE_W, SKETCH_19_OUTSIDE_H)
        with Locations(Location((0, 0, 0), (0, 0, 180))):
            Circle(SKETCH_19_OUTSIDE_R, mode=Mode.SUBTRACT)
    extrude(amount=CUT_EXTRUDE_7_DEPTH, mode=Mode.SUBTRACT)

    # 草图21 → 切除-拉伸9 (cut, two sides: drawn at the far end of the back side and taken through both)
    with BuildSketch(Plane(origin=(0, 0, -1), x_dir=(-1, 0, 0), z_dir=(0, 0, -1)).offset(-CUT_EXTRUDE_9_DEPTH_BACK)):
        with Locations((-14, 0)):
            Circle(SKETCH_21_R)
    extrude(amount=CUT_EXTRUDE_9_DEPTH + CUT_EXTRUDE_9_DEPTH_BACK, mode=Mode.SUBTRACT)

    # 草图22 outside → 切除-拉伸10 (cut)
    with BuildSketch(Plane(origin=(0, 0, -6.5), x_dir=(-1, 0, 0), z_dir=(0, 0, -1))):
        Rectangle(SKETCH_22_OUTSIDE_W, SKETCH_22_OUTSIDE_H)
        with Locations(Location((0, 0, 0), (0, 0, 180))):
            Circle(SKETCH_22_OUTSIDE_R, mode=Mode.SUBTRACT)
    extrude(amount=-CUT_EXTRUDE_10_DEPTH, mode=Mode.SUBTRACT)


solid = body_2_1.part
